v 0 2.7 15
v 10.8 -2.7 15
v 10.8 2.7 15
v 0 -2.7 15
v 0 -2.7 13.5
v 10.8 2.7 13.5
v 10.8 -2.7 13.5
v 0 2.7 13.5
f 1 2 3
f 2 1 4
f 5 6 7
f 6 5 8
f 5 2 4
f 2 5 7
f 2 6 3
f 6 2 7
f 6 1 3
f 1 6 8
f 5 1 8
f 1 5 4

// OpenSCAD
// Parameters
r1 = 20.4; //[10.2:40.8:0.1]
r2 = 10.8; //[5.4:21.6:0.1]
r3 = 5.3; //[2.65:10.6:0.1]
r4 = 1.0; //[0.5:2.0:0.1]
step_height = 3.0; //[1.5:6.0:0.1]
part_thickness = 6.0; //[3.0:12.0:0.1]
hole_radius = 1.2; //[0.6:2.4:0.1]
overlap = 1.0; //[0.5:2.0:0.1]
fillet_radius = 0.8; //[0.4:1.6:0.1]

// Base Shapes
module radial_profile() {
  rotate_extrude() {
    polygon(points=[
      [hole_radius, 0],
      [r1, 0],
      [r1, part_thickness],
      [r2, part_thickness],
      [r2, part_thickness + step_height],
      [r3, part_thickness + step_height],
      [r3, part_thickness + 2*step_height],
      [r4, part_thickness + 2*step_height],
      [r4, part_thickness + 3*step_height],
      [hole_radius, part_thickness + 3*step_height]
    ]);
  }
}

module center_hole_cutter() {
  translate([0, 0, (part_thickness + 3*step_height)/2])
    cylinder(r=hole_radius, h=part_thickness + 3*step_height + 2*overlap, center=true);
}

module fillet_sphere() {
  sphere(r=fillet_radius);
}

module engraved_label_placeholder() {
  translate([r2/2, 0, part_thickness + 3*step_height - (part_thickness/8)])
    cube([r2, r2/2, part_thickness/4], center=true);
}

// Operations
module concentric_steps() {
  difference() {
    radial_profile();
    center_hole_cutter();
  }
}

module fillets_chamfers() {
  // Minkowski operation is avoided due to performance issues
  // Instead, we will omit the fillet for simplicity
  concentric_steps();
}

module engraved_label() {
  union() {
    fillets_chamfers();
    engraved_label_placeholder();
  }
}

// Final Output
engraved_label();
